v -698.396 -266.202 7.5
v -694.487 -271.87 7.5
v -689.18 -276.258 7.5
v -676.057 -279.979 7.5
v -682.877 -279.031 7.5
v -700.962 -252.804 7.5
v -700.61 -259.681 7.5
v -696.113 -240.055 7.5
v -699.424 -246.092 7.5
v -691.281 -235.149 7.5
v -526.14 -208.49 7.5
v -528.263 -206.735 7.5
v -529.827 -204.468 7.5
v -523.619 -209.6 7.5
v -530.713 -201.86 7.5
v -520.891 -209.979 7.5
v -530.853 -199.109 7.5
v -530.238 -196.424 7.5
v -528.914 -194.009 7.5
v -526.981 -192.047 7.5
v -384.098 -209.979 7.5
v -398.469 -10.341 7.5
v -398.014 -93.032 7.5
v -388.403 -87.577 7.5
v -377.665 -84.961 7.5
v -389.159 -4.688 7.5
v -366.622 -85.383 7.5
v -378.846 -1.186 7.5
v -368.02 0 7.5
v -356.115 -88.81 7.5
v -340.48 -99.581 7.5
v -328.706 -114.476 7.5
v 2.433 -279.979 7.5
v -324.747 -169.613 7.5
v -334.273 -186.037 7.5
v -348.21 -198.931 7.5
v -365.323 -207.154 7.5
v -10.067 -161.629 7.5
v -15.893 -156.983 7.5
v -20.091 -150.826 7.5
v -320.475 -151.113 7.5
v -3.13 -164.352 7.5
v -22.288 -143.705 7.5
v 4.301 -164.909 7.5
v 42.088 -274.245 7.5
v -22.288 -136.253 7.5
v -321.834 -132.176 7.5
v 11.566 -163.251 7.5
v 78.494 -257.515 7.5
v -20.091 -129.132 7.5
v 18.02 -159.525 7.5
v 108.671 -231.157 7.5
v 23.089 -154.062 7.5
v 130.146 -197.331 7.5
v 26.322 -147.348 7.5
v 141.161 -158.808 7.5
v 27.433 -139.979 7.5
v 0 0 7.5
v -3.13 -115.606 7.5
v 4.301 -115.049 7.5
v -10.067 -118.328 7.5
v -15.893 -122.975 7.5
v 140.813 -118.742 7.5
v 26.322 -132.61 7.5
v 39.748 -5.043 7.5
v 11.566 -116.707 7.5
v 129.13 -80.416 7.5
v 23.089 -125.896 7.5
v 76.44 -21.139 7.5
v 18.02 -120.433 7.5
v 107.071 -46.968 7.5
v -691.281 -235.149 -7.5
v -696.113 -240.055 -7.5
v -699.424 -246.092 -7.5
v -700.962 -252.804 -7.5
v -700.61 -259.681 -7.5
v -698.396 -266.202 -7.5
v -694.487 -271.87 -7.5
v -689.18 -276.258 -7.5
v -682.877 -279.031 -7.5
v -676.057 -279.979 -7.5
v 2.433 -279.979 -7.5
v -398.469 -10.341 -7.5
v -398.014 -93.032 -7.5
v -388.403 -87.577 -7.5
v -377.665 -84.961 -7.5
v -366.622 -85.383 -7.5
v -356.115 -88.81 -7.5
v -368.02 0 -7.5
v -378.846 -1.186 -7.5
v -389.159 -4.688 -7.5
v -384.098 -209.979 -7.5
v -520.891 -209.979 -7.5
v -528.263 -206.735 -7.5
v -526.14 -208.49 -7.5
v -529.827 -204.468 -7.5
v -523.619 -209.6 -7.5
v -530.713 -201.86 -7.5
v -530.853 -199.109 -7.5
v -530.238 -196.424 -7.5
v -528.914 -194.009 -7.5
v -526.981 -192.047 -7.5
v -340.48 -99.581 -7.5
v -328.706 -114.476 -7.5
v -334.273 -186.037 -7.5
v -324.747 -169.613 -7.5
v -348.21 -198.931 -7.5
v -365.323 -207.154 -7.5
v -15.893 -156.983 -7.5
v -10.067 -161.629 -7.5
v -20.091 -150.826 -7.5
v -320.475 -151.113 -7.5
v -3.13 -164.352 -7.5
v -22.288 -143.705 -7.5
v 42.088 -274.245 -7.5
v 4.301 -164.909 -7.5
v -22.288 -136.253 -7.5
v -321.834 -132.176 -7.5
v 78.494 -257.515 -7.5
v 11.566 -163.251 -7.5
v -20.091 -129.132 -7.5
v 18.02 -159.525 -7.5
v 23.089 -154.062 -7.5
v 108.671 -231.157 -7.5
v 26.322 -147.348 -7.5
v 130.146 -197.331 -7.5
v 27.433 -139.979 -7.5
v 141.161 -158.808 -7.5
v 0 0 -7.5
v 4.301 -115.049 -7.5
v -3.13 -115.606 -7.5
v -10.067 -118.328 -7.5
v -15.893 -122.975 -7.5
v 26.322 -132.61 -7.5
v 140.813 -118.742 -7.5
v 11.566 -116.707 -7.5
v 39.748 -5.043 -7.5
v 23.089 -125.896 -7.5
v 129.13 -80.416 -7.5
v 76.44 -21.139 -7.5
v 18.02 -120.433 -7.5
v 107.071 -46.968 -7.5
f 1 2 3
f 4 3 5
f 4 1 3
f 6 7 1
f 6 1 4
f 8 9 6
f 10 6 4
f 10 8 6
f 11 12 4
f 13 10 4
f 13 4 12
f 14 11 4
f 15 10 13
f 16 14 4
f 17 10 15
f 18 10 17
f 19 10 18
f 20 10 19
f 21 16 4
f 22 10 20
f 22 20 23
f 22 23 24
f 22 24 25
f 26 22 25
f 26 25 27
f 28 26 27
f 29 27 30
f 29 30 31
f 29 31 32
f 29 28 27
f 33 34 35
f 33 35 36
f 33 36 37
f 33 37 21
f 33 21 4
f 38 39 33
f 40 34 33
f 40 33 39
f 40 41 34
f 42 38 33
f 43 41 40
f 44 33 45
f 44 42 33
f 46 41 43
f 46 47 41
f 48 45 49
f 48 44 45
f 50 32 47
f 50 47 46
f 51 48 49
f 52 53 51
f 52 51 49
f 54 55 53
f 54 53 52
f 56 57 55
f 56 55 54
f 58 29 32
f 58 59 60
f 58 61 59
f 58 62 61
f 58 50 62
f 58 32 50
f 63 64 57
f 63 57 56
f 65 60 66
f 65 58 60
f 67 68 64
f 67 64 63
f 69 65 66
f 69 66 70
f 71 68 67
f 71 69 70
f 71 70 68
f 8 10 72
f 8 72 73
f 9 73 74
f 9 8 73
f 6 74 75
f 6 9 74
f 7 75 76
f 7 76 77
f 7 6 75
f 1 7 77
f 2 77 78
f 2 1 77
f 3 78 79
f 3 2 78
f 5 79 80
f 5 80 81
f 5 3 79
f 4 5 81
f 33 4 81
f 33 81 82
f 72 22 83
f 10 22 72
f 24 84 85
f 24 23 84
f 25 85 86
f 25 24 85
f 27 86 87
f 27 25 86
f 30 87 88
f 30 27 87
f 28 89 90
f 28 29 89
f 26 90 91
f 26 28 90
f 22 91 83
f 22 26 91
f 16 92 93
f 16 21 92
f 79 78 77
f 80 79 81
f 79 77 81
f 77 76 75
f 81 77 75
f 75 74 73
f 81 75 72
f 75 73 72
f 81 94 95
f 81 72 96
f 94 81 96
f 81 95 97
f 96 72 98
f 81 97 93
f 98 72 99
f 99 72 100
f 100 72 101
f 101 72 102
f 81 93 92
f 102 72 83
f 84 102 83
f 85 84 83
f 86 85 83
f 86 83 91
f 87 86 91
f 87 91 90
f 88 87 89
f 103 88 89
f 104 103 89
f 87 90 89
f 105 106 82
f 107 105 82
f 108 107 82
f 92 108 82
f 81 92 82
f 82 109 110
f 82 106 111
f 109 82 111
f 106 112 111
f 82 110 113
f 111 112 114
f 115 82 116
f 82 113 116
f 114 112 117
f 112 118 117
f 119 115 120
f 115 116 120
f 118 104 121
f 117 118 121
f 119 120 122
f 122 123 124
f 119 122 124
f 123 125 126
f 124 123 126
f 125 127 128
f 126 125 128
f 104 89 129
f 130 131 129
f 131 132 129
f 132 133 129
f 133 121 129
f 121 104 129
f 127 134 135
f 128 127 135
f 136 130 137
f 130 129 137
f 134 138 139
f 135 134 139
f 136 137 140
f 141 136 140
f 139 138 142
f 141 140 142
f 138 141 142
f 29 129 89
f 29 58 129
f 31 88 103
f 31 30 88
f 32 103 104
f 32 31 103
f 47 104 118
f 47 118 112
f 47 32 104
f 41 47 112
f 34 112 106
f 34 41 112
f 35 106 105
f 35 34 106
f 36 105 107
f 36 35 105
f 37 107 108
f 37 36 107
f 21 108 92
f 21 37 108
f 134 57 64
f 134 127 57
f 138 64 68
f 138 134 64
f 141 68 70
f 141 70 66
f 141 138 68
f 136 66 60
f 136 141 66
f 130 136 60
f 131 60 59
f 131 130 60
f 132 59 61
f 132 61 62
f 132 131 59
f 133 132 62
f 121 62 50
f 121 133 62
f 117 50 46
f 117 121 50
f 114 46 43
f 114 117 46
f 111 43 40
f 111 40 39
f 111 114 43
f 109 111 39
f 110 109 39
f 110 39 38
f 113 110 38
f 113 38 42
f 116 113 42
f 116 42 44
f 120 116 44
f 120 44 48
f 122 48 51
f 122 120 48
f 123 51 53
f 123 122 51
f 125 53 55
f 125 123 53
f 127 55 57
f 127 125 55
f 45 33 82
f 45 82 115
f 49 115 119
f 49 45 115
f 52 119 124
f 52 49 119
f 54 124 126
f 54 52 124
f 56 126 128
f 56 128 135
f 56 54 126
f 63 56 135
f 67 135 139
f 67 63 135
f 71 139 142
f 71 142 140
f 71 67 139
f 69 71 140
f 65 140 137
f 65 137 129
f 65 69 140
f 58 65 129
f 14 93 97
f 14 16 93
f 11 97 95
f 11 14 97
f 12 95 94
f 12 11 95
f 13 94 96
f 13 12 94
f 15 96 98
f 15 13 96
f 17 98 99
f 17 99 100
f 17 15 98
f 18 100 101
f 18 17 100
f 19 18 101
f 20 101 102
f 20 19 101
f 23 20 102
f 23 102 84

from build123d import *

# Parameters (mm, degrees)
SKETCH2_R           = 25
BOSS_EXTRUDE1_DEPTH = 7.5


with BuildPart() as part:
    # Sketch2 → Boss-Extrude1 (new body, symmetric)
    with BuildSketch(Plane.XY):
        with BuildLine():
            Line((-398.468541926, -10.340558916), (-691.280931438, -235.14913744))
            ThreePointArc((-691.280931438, -235.14913744), (-699.728704435, -263.018042843), (-676.056537091, -279.978857982))
            Line((-676.056537091, -279.978857982), (2.432964843, -279.978857982))
            ThreePointArc((2.432964843, -279.978857982), (142.427679239, -138.762329632), (0, 0))
            Line((0, 0), (-368.019753232, 0))
            ThreePointArc((-368.019753232, 0), (-384.098122954, -2.655665311), (-398.468541926, -10.340558916))
        make_face()
        with Locations((2.432964843, -139.978857982)):
            Circle(SKETCH2_R, mode=Mode.SUBTRACT)
        with BuildLine():
            Line((-526.980915272, -192.046969766), (-398.014187587, -93.031942512))
            ThreePointArc((-398.014187587, -93.031942512), (-377.665337115, -84.961022387), (-356.115398822, -88.810129655))
            ThreePointArc((-356.115398822, -88.810129655), (-321.919160325, -160.522945456), (-384.098122954, -209.978857982))
            Line((-384.098122954, -209.978857982), (-520.891157533, -209.978857982))
            ThreePointArc((-520.891157533, -209.978857982), (-530.360024471, -203.194531927), (-526.980915272, -192.046969766))
        make_face(mode=Mode.SUBTRACT)
    extrude(amount=BOSS_EXTRUDE1_DEPTH, both=True)


solid = part.part
